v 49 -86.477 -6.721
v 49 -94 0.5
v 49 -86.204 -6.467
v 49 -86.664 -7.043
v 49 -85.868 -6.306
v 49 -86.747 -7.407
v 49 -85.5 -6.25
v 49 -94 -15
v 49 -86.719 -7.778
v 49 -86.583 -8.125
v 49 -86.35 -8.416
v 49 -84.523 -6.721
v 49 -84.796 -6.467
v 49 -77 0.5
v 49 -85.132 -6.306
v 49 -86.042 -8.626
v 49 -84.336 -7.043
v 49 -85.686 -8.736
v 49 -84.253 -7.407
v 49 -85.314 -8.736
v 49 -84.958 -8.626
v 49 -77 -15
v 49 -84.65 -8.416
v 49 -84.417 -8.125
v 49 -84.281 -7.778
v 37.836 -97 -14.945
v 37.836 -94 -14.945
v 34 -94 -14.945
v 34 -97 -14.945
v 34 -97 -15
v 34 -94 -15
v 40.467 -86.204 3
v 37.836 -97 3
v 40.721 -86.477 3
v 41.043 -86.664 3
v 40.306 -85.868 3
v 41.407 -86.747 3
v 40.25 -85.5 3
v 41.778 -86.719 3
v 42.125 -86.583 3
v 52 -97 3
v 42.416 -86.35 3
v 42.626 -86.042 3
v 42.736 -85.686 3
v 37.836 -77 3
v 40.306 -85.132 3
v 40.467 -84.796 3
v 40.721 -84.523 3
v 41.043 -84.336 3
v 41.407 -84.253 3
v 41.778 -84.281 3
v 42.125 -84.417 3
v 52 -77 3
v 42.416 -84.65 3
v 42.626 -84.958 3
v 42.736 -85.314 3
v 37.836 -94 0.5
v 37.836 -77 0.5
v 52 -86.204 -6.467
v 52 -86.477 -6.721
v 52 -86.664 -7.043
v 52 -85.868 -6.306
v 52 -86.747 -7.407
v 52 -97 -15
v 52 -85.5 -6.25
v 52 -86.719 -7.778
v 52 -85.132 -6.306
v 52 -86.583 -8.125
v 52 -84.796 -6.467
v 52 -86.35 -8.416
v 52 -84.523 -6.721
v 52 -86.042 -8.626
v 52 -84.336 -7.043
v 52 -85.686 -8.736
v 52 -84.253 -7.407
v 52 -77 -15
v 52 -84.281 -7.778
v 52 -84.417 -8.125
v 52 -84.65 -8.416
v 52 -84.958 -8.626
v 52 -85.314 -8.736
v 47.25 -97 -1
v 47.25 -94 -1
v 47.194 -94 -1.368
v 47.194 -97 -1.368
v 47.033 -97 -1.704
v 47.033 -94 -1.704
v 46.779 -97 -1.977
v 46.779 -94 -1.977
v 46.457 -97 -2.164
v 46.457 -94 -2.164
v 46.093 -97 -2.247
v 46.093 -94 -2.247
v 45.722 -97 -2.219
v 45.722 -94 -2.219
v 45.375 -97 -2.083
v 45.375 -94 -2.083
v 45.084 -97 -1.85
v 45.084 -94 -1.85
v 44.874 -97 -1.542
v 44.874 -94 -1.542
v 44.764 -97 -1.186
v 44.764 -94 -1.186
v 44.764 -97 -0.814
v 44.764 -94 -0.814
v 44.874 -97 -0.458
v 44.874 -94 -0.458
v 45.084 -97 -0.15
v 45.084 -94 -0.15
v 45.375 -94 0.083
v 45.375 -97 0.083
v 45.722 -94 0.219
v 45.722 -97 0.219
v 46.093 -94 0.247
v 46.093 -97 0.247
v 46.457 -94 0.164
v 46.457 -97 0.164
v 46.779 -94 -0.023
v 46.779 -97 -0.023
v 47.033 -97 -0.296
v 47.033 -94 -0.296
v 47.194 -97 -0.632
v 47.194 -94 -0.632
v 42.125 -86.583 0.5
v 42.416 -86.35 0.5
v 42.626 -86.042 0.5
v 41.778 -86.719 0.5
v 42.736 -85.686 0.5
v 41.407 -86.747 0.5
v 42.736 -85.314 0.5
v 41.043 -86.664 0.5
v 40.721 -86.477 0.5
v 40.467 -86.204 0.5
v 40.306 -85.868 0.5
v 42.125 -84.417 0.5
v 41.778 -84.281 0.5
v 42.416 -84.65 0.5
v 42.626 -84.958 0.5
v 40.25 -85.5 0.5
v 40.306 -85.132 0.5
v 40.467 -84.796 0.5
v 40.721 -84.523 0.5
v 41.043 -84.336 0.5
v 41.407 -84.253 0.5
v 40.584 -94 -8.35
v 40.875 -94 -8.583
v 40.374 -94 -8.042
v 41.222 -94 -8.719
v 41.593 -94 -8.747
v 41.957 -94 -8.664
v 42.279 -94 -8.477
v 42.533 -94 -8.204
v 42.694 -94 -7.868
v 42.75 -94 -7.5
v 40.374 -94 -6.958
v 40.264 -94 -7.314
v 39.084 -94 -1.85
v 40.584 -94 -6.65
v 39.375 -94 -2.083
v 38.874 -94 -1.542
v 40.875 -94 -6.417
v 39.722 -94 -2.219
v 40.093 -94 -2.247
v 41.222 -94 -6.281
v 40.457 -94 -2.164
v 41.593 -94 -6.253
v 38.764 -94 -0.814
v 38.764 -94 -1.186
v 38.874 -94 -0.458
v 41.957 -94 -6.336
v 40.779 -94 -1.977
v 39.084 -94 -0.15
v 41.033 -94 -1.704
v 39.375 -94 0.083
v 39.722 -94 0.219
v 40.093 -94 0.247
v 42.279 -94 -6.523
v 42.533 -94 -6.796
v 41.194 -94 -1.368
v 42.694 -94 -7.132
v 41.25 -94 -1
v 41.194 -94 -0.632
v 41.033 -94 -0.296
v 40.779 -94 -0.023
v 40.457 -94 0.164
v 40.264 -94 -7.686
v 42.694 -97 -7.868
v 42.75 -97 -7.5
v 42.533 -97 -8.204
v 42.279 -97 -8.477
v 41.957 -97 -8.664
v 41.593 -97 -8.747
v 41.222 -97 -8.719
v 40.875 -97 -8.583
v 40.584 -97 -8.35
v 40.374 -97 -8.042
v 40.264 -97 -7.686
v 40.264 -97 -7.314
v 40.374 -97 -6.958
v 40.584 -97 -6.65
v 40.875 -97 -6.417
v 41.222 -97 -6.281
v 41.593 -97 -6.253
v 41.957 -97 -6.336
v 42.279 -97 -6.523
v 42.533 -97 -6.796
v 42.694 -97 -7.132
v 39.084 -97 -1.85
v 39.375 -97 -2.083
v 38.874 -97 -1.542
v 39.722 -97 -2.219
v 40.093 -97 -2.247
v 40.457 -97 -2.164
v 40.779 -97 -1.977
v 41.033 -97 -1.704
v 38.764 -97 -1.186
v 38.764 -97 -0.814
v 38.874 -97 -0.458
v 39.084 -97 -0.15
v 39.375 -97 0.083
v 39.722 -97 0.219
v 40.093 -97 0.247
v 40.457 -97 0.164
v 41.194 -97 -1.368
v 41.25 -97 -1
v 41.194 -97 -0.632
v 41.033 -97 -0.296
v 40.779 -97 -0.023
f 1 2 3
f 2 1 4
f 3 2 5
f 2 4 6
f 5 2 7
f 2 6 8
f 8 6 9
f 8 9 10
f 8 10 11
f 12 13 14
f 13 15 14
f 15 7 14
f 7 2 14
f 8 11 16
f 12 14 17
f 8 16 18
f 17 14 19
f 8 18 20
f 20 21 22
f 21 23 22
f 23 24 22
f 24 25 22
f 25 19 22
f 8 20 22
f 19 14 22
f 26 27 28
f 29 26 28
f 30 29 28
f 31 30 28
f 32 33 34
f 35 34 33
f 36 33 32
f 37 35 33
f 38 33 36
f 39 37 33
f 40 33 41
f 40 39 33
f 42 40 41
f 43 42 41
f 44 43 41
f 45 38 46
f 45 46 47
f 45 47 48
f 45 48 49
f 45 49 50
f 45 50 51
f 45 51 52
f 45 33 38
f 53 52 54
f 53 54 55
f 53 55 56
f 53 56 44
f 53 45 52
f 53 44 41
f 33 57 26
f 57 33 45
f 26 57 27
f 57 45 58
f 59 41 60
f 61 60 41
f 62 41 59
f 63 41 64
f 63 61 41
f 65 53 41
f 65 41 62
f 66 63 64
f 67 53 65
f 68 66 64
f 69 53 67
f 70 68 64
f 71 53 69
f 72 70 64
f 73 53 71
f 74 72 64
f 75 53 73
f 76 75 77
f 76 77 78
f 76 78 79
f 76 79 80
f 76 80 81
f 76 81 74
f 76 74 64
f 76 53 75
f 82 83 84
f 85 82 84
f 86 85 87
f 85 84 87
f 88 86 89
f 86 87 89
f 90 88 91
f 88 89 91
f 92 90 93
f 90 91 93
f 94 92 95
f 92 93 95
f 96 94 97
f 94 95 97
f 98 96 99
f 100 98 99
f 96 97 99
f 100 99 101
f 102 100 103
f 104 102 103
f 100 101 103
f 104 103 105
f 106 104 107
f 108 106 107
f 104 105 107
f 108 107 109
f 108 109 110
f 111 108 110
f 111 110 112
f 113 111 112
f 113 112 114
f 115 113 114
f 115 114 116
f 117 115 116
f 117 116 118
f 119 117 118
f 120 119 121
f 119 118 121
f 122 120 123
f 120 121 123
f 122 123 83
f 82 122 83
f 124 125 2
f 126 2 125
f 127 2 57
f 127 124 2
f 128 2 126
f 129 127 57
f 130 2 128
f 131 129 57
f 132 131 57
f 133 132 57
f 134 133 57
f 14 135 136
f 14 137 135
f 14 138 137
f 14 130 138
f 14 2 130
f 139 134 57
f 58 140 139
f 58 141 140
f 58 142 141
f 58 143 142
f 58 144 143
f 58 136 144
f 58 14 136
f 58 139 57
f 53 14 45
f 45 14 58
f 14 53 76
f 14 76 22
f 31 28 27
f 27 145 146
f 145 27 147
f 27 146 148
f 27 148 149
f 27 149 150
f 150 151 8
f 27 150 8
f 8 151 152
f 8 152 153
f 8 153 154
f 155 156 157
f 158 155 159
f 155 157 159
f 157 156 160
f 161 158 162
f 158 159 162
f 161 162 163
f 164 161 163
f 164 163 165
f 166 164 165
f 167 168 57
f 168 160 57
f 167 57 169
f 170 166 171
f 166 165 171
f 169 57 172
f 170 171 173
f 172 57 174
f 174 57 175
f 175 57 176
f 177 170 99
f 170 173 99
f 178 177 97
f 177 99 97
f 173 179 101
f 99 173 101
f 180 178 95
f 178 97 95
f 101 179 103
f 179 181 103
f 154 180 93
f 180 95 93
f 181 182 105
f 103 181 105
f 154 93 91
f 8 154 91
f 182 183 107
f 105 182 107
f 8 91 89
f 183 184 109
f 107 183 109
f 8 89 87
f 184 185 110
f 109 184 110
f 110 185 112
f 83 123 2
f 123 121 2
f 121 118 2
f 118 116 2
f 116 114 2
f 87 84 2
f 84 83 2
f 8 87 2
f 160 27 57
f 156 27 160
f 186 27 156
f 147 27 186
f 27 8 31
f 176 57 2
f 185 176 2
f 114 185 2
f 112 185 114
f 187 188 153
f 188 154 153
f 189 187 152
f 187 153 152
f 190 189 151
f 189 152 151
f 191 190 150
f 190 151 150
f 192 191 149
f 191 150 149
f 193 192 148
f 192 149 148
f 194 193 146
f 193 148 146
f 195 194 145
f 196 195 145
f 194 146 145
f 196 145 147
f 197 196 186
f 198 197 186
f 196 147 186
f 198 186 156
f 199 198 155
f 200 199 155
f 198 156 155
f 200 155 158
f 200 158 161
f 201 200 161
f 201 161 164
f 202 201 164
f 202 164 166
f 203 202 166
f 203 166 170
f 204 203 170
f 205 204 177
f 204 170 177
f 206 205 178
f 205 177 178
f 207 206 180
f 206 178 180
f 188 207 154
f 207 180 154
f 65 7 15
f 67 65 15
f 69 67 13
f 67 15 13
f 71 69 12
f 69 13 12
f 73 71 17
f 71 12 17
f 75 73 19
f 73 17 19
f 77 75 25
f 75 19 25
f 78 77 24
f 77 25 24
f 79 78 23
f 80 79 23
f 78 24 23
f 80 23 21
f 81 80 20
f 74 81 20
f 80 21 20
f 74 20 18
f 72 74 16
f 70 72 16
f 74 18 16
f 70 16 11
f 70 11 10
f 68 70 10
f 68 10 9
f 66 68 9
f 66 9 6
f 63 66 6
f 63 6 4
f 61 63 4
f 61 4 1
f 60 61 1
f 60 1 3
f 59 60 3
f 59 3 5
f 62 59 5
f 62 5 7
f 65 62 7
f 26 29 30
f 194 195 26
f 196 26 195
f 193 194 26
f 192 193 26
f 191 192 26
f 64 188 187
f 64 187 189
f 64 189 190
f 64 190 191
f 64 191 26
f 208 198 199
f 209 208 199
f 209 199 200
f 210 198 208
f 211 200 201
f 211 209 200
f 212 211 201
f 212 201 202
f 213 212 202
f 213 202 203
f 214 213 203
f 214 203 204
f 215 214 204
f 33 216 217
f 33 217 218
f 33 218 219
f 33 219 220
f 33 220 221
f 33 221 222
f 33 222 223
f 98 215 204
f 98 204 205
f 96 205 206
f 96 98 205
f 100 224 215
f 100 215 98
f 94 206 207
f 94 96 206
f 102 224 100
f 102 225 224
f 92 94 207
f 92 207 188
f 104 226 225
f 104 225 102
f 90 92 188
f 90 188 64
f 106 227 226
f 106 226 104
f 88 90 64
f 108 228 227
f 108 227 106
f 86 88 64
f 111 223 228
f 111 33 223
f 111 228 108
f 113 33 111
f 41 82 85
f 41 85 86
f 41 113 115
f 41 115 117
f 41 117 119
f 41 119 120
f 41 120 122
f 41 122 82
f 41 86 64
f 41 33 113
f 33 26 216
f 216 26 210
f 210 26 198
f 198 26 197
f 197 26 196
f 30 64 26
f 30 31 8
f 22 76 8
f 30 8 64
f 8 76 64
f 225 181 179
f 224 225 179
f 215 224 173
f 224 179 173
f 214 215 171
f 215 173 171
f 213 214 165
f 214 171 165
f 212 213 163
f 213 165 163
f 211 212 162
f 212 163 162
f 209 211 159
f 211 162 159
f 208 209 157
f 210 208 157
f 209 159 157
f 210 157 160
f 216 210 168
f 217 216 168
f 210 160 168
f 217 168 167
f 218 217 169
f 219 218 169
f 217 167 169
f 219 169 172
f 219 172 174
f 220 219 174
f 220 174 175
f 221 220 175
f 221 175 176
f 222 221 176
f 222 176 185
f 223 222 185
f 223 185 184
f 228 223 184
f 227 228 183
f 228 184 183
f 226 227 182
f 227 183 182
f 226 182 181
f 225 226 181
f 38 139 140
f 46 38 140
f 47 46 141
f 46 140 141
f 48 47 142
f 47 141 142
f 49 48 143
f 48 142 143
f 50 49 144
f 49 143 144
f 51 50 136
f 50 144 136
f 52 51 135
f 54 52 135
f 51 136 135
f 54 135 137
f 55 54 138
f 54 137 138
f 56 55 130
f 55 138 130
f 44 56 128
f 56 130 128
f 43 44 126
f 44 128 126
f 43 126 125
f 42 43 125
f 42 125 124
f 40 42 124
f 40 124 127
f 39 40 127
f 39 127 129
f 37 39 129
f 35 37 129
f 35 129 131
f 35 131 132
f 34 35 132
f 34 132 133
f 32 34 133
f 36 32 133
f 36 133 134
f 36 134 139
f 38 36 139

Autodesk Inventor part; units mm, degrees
ref_plane "YZ Plane" through (0, 0, 0) normal (1, 0, 0) x (0, 1, 0)
ref_plane "XZ Plane" through (0, 0, 0) normal (0, 1, 0) x (-1, 0, 0)
ref_plane "XY Plane" through (0, 0, 0) normal (0, 0, 1) x (1, 0, 0)
ref_plane "작업 평면1" through (0, 0, 0) normal (0, 0, 1) x (1, 0, 0)
sketch "스케치1" plane through (0, 0, 0) normal (0, 0, 1) x (1, 0, 0)
  line L0 (49, -94) -> (-72, -94) construction
  line L1 (49, -88) -> (49, -94) construction
  line L2 (-72, -88) -> (49, -88) construction
  line L3 (-72, -94) -> (-72, -88) construction
  line L4 (43, 88) -> (43, -88) construction
  line L5 (49, -88) -> (43, -88) construction
  line L6 (49, 88) -> (49, -88) construction
  line L7 (49, 88) -> (43, 88) construction
  line L8 (-72, -88) -> (43, -88) construction
  line L9 (43, -88) -> (43, 88) construction
  line L10 (-72, 88) -> (43, 88) construction
  line L11 (-72, 88) -> (-72, -88) construction
  circle A0 centre (-2.8299, 17.3) radius 1.35 construction
  circle A1 centre (19.1701, -17.3) radius 1.35 construction
  circle A2 centre (-24.8299, 17.3) radius 1.35 construction
  circle A3 centre (19.1701, 17.3) radius 1.35 construction
  circle A4 centre (-2.8299, -17.3) radius 1.35 construction
  circle A5 centre (-24.8299, -17.3) radius 1.35 construction
  arc A6 (-27.4299, -13.5) -> (-26.3299, -14.6) centre (-26.3299, -13.5) ccw construction
  line L12 (-27.4299, -13.5) -> (-27.4299, 13.5) construction
  arc A7 (-26.3299, 14.6) -> (-27.4299, 13.5) centre (-26.3299, 13.5) ccw construction
  line L13 (-26.3299, 14.6) -> (28.6701, 14.6) construction
  line L14 (28.6701, 14.6) -> (28.6701, -14.6) construction
  line L15 (28.6701, -14.6) -> (-26.3299, -14.6) construction
  line L16 (-72, -88) -> (43, -88) construction
  line L17 (43, -88) -> (43, 88) construction
  line L18 (-72, 88) -> (43, 88) construction
  line L19 (-72, 88) -> (-72, -88) construction
  circle A8 centre (-2.8299, 17.3) radius 1.35 construction
  circle A9 centre (19.1701, -17.3) radius 1.35 construction
  circle A10 centre (-24.8299, 17.3) radius 1.35 construction
  circle A11 centre (19.1701, 17.3) radius 1.35 construction
  circle A12 centre (-2.8299, -17.3) radius 1.35 construction
  circle A13 centre (-24.8299, -17.3) radius 1.35 construction
  arc A14 (-27.4299, -13.5) -> (-26.3299, -14.6) centre (-26.3299, -13.5) ccw construction
  line L20 (-27.4299, -13.5) -> (-27.4299, 13.5) construction
  arc A15 (-26.3299, 14.6) -> (-27.4299, 13.5) centre (-26.3299, 13.5) ccw construction
  line L21 (-26.3299, 14.6) -> (28.6701, 14.6) construction
  line L22 (28.6701, 14.6) -> (28.6701, -14.6) construction
  line L23 (28.6701, -14.6) -> (-26.3299, -14.6) construction
  line L24 (43, 88) -> (43, -88) projected
  line L25 (49, -88) -> (43, -88) projected
  line L26 (49, 88) -> (49, -88) projected
  line L27 (49, 88) -> (43, 88) projected
  line L28 (49, -94) -> (-72, -94) projected
  line L29 (49, -88) -> (49, -94) projected
  line L30 (-72, -88) -> (49, -88) projected
  line L31 (-72, -94) -> (-72, -88) projected
  line L32 (-72, -88) -> (43, -88) projected
  line L33 (43, -88) -> (43, 88) projected
  line L34 (-72, 88) -> (43, 88) projected
  line L35 (-72, 88) -> (-72, -88) projected
  circle A16 centre (-2.8299, 17.3) radius 1.35 projected
  circle A17 centre (19.1701, -17.3) radius 1.35 projected
  circle A18 centre (-24.8299, 17.3) radius 1.35 projected
  circle A19 centre (19.1701, 17.3) radius 1.35 projected
  circle A20 centre (-2.8299, -17.3) radius 1.35 projected
  circle A21 centre (-24.8299, -17.3) radius 1.35 projected
  arc A22 (-27.4299, -13.5) -> (-26.3299, -14.6) centre (-26.3299, -13.5) ccw projected
  line L36 (-27.4299, -13.5) -> (-27.4299, 13.5) projected
  arc A23 (-26.3299, 14.6) -> (-27.4299, 13.5) centre (-26.3299, 13.5) ccw projected
  line L37 (-26.3299, 14.6) -> (28.6701, 14.6) projected
  line L38 (28.6701, 14.6) -> (28.6701, -14.6) projected
  line L39 (28.6701, -14.6) -> (-26.3299, -14.6) projected
  line L40 (49, -94) -> (-72, -94) projected
  line L41 (49, -88) -> (49, -94) projected
  line L42 (-72, -88) -> (49, -88) projected
  line L43 (-72, -94) -> (-72, -88) projected
  line L44 (49, -94) -> (49, -77)
  line L45 (49, -94) -> (32, -94)
  line L46 (49, -77) -> (43, -77)
  line L47 (32, -94) -> (32, -88)
  line L48 (49, -94) -> (32, -94)
  line L49 (32, -94) -> (32, -77)
  line L50 (32, -77) -> (49, -77)
  line L51 (49, -77) -> (49, -94)
  line L52 (49, -94) -> (29, -94)
  line L53 (29, -94) -> (29, -77)
  line L54 (29, -77) -> (49, -77)
  line L55 (49, -77) -> (49, -94)
  point P0 (0, 0)
  dimension "d0" = 17
  dimension "d1" = 17
  dimension "d28" = 20
extrude "돌출1" add sketch "스케치1" along normal blind 3 contours L46 L26 L25 L24 | L24 L30 L49 L50 | L25 L29 L28 L47 L30 | L49 L30 L53 L54 | L47 L28 L53 L30
sketch "스케치2" plane through (49, -94, 0) normal (1, 0, 0) x (0, 0, -1)
  line L0 (40.7085, 16) -> (17.2915, 16) projected
  arc A0 (16.3174, 17.226) -> (17.2915, 16) centre (17.2915, 17) ccw projected
  line L1 (16.3174, 17.226) -> (28.0259, 67.6827) projected
  arc A1 (29.9741, 67.6827) -> (28.0259, 67.6827) centre (29, 67.4566) ccw projected
  line L2 (29.9741, 67.6827) -> (41.6826, 17.226) projected
  arc A2 (40.7085, 16) -> (41.6826, 17.226) centre (40.7085, 17) ccw projected
  line L3 (34.1853, 94.226) -> (45.1259, 141.3733) projected
  arc A3 (47.1, 141.1472) -> (45.1259, 141.3733) centre (46.1, 141.1472) ccw projected
  line L4 (47.1, 141.1472) -> (47.1, 46.8528) projected
  arc A4 (45.1259, 46.6267) -> (47.1, 46.8528) centre (46.1, 46.8528) ccw projected
  line L5 (45.1259, 46.6267) -> (34.1853, 93.774) projected
  arc A5 (34.1853, 94.226) -> (34.1853, 93.774) centre (35.1594, 94) ccw projected
  line L6 (10.9, 46.8528) -> (10.9, 141.1472) projected
  arc A6 (12.8741, 141.3733) -> (10.9, 141.1472) centre (11.9, 141.1472) ccw projected
  line L7 (12.8741, 141.3733) -> (23.8147, 94.226) projected
  arc A7 (23.8147, 93.774) -> (23.8147, 94.226) centre (22.8406, 94) ccw projected
  line L8 (23.8147, 93.774) -> (12.8741, 46.6267) projected
  arc A8 (10.9, 46.8528) -> (12.8741, 46.6267) centre (11.9, 46.8528) ccw projected
  line L9 (28.0259, 120.3173) -> (16.3174, 170.774) projected
  arc A9 (17.2915, 172) -> (16.3174, 170.774) centre (17.2915, 171) ccw projected
  line L10 (17.2915, 172) -> (40.7085, 172) projected
  arc A10 (41.6826, 170.774) -> (40.7085, 172) centre (40.7085, 171) ccw projected
  line L11 (41.6826, 170.774) -> (29.9741, 120.3173) projected
  arc A11 (28.0259, 120.3173) -> (29.9741, 120.3173) centre (29, 120.5434) ccw projected
  line L12 (58, 182) -> (0, 182) projected
  line L13 (0, 182) -> (0, 6) projected
  line L14 (58, 6) -> (0, 6) projected
  line L15 (58, 6) -> (58, 182) projected
  line L16 (58, 0) -> (0, 0) projected
  line L17 (58, 6) -> (58, 0) projected
  line L18 (0, 6) -> (58, 6) projected
  line L19 (0, 6) -> (0, 0) projected
  line L20 (6, 182) -> (6, 6) projected
  line L21 (0, 0) -> (0, 17) projected
  line L22 (0, 17) -> (-3, 17) projected
  line L23 (-3, 0) -> (-3, 17) projected
  line L24 (0, 0) -> (-3, 0) projected
  line L25 (-3, 0) -> (22, 0)
  line L26 (22, 0) -> (22, 17)
  line L27 (22, 17) -> (-3, 17)
  line L28 (-3, 17) -> (-3, 0)
  point P0 (0, 94)
  point P1 (0, 0)
  point P2 (22, 0)
  point P3 (22, 16)
  point P4 (16.2915, 17)
  point P5 (0, 17)
  dimension "d4" = 25
extrude "돌출2" add sketch "스케치2" along normal blind 3 contours L26 L14 L20 L27 A0 L0 | L0 A0 L27 L26 | L26 L16 L19 L14 | L14 L13 L27 L20 | L19 L24 L23 L22 L13
sketch "스케치3" plane through (32, -94, 0) normal (0, -1, 0) x (1, 0, 0)
  line L0 (20, 3) -> (20, -22) projected
  line L1 (0, 0) -> (0, 3) projected
  line L2 (20, -22) -> (0, -22)
  line L3 (0, -22) -> (0, 3)
  line L4 (0, 3) -> (20, 3)
  line L5 (20, 3) -> (20, -22)
  line L6 (20, 3) -> (-3, 3)
  line L7 (-3, 3) -> (-3, -22)
  line L8 (-3, -22) -> (20, -22)
  line L9 (20, -22) -> (20, 3)
  point P0 (-32, 0)
  point P1 (20, 3)
  point P2 (0, -22)
  dimension "d27" = 23
extrude "돌출3" add sketch "스케치3" along normal blind 3
sketch "스케치8" plane through (0, 0, 3) normal (0, 0, 1) x (1, 0, 0)
  line L0 (29, -97) -> (52, -97) projected
  line L1 (29, -77) -> (52, -77) projected
  line L2 (52, -97) -> (34, -97)
  line L3 (34, -97) -> (34, -77)
  line L4 (34, -77) -> (52, -77)
  line L5 (52, -77) -> (52, -97)
  line L6 (34, -77) -> (29, -77)
  line L7 (29, -77) -> (29, -97)
  line L8 (29, -97) -> (34, -97)
  line L9 (34, -97) -> (34, -77)
  point P0 (0, 0)
  dimension "d29" = 18
extrude "돌출8" cut sketch "스케치8" against normal blind 50 contours L7 L1 L3 L0
sketch "스케치10" plane through (52, -94, 0) normal (1, 0, 0) x (0, 0, -1)
  line L0 (-3, 17) -> (-3, -3) projected
  line L1 (22, -3) -> (-3, -3) projected
  line L2 (-3, 17) -> (17, 17)
  line L3 (17, 17) -> (17, -3)
  line L4 (17, -3) -> (-3, -3)
  line L5 (-3, -3) -> (-3, 17)
  line L6 (-3, 17) -> (15, 17)
  line L7 (15, 17) -> (15, -3)
  line L8 (15, -3) -> (-3, -3)
  line L9 (-3, -3) -> (-3, 17)
  line L10 (15, 17) -> (22, 17)
  line L11 (22, 17) -> (22, -3)
  line L12 (22, -3) -> (15, -3)
  line L13 (15, -3) -> (15, 17)
  point P0 (0, 94)
  point P1 (15, 17)
  point P2 (17, 17)
  dimension "d32" = 20
  dimension "d33" = 18
extrude "돌출9" cut sketch "스케치10" against normal blind 50 contours L2 L3 L1 L7 | L10 L11 L1 L3
sketch "스케치12" plane through (32, -94, 0) normal (0, 1, 0) x (1, 0, 0)
  circle A0 centre (14, 1) radius 1.25 projected
  circle A1 centre (8, 17) radius 1.25 projected
  circle A2 centre (8, 1) radius 1.25 projected
  circle A3 centre (14, 17) radius 1.25 projected
  line L0 (4, -3) -> (20, -3) projected
  line L1 (20, 21) -> (20, -3) projected
  line L2 (4, 21) -> (20, 21) projected
  line L3 (4, 21) -> (4, -3) projected
  circle A4 centre (14, 1) radius 1.25 projected
  arc A5 (8.2846, 1.2694) -> (7.5179, 0.8668) centre (7.785, 1.2894) ccw projected
  point P0 (-32, 0)
extrude "돌출10" cut sketch "스케치12" against normal blind 50 contours A0 | A2
sketch "스케치13" plane through (0, 0, 0) normal (0, 0, -1) x (-1, 0, 0)
  line L0 (-34, -94) -> (-34, -77) projected
  line L1 (-49, -77) -> (-34, -77) projected
  line L2 (-49, -94) -> (-49, -77) projected
  line L3 (-46.75, -94) -> (-49, -94) projected
  line L4 (-45.25, -94) -> (-46.75, -94) projected
  line L5 (-40.75, -94) -> (-45.25, -94) projected
  line L6 (-39.25, -94) -> (-40.75, -94) projected
  line L7 (-34, -94) -> (-39.25, -94) projected
  line L8 (-41.5, -94) -> (-41.5, -77)
  line L9 (-34, -85.5) -> (-49, -85.5)
  circle A0 centre (-41.5, -85.5) radius 1.25
  point P0 (0, 0)
  dimension "d38" = 2.5
extrude "돌출11" cut sketch "스케치13" against normal blind 50 contours A0 L8 L9 | L9 L8 A0 | L9 A0 L8 | L8 A0 L9
sketch "스케치14" plane through (49, -94, 0) normal (-1, 0, 0) x (0, 0, 1)
  line L0 (-15, 17) -> (-15, 0) projected
  line L1 (0, 0) -> (-15, 0) projected
  line L2 (0, 0) -> (0, 17) projected
  line L3 (-15, 17) -> (0, 17) projected
  line L4 (-15, 8.5) -> (0, 8.5)
  line L5 (0, 0) -> (-15, 0) projected
  line L6 (-7.5, 0) -> (-7.5, 17)
  circle A0 centre (-7.5, 8.5) radius 1.25
  point P0 (0, 94)
  dimension "d41" = 2.5
extrude "돌출12" cut sketch "스케치14" against normal blind 50 contours A0 L6 L4 | L4 L6 A0 | A0 L4 L6 | L4 A0 L6
sketch "스케치15" plane through (32, -94, 0) normal (0, 1, 0) x (1, 0, 0)
  arc A0 (8.75, 0) -> (7.25, 0) centre (8, 1) ccw projected
  line L0 (8.75, 0) -> (13.25, 0) projected
  arc A1 (14.75, 0) -> (13.25, 0) centre (14, 1) ccw projected
  line L1 (14.75, 0) -> (17, 0) projected
  line L2 (17, 0) -> (17, 15) projected
  line L3 (17, 15) -> (2, 15) projected
  line L4 (2, 15) -> (2, 0) projected
  line L5 (2, 0) -> (7.25, 0) projected
  line L6 (9.5, 15) -> (9.5, 0)
  line L7 (8.75, 0) -> (13.25, 0) projected
  line L8 (2, 15) -> (2, 0) projected
  line L9 (2, 7.5) -> (17, 7.5)
  circle A2 centre (9.5, 7.5) radius 1.25
  point P0 (-32, 0)
  dimension "d44" = 2.5
extrude "돌출13" cut sketch "스케치15" against normal blind 50 contours A2 L9 L6 | L6 L9 A2 | L9 A2 L6 | L6 A2 L9
sketch "스케치16" plane through (0, 0, 0) normal (0, 0, -1) x (-1, 0, 0)
  circle A0 centre (-41.5, -85.5) radius 1.25 projected
  line L0 (-34, -94) -> (-34, -77) projected
  line L1 (-49, -77) -> (-34, -77) projected
  line L2 (-49, -94) -> (-49, -77) projected
  line L3 (-46.75, -94) -> (-49, -94) projected
  line L4 (-45.25, -94) -> (-46.75, -94) projected
  line L5 (-40.75, -94) -> (-45.25, -94) projected
  line L6 (-39.25, -94) -> (-40.75, -94) projected
  line L7 (-34, -94) -> (-39.25, -94) projected
  point P0 (0, 0)
extrude "돌출14" cut sketch "스케치16" against normal blind 0.5
sketch "스케치17" plane through (34, -77, 3) normal (0, 1, 0) x (1, 0, 0)
  line L0 (18, 0) -> (0, 0) projected
  line L1 (0, 0) -> (3.8357, 0)
  line L2 (3.8357, 0) -> (3.8357, 17.9453)
  line L3 (3.8357, 17.9453) -> (0, 17.9453)
  line L4 (0, 17.9453) -> (0, 0)
  point P0 (-34, 3)
  point P1 (3.8357, 0)
extrude "돌출15" cut sketch "스케치17" against normal blind 50
properties part number "10" material "LCP 플라스틱"
